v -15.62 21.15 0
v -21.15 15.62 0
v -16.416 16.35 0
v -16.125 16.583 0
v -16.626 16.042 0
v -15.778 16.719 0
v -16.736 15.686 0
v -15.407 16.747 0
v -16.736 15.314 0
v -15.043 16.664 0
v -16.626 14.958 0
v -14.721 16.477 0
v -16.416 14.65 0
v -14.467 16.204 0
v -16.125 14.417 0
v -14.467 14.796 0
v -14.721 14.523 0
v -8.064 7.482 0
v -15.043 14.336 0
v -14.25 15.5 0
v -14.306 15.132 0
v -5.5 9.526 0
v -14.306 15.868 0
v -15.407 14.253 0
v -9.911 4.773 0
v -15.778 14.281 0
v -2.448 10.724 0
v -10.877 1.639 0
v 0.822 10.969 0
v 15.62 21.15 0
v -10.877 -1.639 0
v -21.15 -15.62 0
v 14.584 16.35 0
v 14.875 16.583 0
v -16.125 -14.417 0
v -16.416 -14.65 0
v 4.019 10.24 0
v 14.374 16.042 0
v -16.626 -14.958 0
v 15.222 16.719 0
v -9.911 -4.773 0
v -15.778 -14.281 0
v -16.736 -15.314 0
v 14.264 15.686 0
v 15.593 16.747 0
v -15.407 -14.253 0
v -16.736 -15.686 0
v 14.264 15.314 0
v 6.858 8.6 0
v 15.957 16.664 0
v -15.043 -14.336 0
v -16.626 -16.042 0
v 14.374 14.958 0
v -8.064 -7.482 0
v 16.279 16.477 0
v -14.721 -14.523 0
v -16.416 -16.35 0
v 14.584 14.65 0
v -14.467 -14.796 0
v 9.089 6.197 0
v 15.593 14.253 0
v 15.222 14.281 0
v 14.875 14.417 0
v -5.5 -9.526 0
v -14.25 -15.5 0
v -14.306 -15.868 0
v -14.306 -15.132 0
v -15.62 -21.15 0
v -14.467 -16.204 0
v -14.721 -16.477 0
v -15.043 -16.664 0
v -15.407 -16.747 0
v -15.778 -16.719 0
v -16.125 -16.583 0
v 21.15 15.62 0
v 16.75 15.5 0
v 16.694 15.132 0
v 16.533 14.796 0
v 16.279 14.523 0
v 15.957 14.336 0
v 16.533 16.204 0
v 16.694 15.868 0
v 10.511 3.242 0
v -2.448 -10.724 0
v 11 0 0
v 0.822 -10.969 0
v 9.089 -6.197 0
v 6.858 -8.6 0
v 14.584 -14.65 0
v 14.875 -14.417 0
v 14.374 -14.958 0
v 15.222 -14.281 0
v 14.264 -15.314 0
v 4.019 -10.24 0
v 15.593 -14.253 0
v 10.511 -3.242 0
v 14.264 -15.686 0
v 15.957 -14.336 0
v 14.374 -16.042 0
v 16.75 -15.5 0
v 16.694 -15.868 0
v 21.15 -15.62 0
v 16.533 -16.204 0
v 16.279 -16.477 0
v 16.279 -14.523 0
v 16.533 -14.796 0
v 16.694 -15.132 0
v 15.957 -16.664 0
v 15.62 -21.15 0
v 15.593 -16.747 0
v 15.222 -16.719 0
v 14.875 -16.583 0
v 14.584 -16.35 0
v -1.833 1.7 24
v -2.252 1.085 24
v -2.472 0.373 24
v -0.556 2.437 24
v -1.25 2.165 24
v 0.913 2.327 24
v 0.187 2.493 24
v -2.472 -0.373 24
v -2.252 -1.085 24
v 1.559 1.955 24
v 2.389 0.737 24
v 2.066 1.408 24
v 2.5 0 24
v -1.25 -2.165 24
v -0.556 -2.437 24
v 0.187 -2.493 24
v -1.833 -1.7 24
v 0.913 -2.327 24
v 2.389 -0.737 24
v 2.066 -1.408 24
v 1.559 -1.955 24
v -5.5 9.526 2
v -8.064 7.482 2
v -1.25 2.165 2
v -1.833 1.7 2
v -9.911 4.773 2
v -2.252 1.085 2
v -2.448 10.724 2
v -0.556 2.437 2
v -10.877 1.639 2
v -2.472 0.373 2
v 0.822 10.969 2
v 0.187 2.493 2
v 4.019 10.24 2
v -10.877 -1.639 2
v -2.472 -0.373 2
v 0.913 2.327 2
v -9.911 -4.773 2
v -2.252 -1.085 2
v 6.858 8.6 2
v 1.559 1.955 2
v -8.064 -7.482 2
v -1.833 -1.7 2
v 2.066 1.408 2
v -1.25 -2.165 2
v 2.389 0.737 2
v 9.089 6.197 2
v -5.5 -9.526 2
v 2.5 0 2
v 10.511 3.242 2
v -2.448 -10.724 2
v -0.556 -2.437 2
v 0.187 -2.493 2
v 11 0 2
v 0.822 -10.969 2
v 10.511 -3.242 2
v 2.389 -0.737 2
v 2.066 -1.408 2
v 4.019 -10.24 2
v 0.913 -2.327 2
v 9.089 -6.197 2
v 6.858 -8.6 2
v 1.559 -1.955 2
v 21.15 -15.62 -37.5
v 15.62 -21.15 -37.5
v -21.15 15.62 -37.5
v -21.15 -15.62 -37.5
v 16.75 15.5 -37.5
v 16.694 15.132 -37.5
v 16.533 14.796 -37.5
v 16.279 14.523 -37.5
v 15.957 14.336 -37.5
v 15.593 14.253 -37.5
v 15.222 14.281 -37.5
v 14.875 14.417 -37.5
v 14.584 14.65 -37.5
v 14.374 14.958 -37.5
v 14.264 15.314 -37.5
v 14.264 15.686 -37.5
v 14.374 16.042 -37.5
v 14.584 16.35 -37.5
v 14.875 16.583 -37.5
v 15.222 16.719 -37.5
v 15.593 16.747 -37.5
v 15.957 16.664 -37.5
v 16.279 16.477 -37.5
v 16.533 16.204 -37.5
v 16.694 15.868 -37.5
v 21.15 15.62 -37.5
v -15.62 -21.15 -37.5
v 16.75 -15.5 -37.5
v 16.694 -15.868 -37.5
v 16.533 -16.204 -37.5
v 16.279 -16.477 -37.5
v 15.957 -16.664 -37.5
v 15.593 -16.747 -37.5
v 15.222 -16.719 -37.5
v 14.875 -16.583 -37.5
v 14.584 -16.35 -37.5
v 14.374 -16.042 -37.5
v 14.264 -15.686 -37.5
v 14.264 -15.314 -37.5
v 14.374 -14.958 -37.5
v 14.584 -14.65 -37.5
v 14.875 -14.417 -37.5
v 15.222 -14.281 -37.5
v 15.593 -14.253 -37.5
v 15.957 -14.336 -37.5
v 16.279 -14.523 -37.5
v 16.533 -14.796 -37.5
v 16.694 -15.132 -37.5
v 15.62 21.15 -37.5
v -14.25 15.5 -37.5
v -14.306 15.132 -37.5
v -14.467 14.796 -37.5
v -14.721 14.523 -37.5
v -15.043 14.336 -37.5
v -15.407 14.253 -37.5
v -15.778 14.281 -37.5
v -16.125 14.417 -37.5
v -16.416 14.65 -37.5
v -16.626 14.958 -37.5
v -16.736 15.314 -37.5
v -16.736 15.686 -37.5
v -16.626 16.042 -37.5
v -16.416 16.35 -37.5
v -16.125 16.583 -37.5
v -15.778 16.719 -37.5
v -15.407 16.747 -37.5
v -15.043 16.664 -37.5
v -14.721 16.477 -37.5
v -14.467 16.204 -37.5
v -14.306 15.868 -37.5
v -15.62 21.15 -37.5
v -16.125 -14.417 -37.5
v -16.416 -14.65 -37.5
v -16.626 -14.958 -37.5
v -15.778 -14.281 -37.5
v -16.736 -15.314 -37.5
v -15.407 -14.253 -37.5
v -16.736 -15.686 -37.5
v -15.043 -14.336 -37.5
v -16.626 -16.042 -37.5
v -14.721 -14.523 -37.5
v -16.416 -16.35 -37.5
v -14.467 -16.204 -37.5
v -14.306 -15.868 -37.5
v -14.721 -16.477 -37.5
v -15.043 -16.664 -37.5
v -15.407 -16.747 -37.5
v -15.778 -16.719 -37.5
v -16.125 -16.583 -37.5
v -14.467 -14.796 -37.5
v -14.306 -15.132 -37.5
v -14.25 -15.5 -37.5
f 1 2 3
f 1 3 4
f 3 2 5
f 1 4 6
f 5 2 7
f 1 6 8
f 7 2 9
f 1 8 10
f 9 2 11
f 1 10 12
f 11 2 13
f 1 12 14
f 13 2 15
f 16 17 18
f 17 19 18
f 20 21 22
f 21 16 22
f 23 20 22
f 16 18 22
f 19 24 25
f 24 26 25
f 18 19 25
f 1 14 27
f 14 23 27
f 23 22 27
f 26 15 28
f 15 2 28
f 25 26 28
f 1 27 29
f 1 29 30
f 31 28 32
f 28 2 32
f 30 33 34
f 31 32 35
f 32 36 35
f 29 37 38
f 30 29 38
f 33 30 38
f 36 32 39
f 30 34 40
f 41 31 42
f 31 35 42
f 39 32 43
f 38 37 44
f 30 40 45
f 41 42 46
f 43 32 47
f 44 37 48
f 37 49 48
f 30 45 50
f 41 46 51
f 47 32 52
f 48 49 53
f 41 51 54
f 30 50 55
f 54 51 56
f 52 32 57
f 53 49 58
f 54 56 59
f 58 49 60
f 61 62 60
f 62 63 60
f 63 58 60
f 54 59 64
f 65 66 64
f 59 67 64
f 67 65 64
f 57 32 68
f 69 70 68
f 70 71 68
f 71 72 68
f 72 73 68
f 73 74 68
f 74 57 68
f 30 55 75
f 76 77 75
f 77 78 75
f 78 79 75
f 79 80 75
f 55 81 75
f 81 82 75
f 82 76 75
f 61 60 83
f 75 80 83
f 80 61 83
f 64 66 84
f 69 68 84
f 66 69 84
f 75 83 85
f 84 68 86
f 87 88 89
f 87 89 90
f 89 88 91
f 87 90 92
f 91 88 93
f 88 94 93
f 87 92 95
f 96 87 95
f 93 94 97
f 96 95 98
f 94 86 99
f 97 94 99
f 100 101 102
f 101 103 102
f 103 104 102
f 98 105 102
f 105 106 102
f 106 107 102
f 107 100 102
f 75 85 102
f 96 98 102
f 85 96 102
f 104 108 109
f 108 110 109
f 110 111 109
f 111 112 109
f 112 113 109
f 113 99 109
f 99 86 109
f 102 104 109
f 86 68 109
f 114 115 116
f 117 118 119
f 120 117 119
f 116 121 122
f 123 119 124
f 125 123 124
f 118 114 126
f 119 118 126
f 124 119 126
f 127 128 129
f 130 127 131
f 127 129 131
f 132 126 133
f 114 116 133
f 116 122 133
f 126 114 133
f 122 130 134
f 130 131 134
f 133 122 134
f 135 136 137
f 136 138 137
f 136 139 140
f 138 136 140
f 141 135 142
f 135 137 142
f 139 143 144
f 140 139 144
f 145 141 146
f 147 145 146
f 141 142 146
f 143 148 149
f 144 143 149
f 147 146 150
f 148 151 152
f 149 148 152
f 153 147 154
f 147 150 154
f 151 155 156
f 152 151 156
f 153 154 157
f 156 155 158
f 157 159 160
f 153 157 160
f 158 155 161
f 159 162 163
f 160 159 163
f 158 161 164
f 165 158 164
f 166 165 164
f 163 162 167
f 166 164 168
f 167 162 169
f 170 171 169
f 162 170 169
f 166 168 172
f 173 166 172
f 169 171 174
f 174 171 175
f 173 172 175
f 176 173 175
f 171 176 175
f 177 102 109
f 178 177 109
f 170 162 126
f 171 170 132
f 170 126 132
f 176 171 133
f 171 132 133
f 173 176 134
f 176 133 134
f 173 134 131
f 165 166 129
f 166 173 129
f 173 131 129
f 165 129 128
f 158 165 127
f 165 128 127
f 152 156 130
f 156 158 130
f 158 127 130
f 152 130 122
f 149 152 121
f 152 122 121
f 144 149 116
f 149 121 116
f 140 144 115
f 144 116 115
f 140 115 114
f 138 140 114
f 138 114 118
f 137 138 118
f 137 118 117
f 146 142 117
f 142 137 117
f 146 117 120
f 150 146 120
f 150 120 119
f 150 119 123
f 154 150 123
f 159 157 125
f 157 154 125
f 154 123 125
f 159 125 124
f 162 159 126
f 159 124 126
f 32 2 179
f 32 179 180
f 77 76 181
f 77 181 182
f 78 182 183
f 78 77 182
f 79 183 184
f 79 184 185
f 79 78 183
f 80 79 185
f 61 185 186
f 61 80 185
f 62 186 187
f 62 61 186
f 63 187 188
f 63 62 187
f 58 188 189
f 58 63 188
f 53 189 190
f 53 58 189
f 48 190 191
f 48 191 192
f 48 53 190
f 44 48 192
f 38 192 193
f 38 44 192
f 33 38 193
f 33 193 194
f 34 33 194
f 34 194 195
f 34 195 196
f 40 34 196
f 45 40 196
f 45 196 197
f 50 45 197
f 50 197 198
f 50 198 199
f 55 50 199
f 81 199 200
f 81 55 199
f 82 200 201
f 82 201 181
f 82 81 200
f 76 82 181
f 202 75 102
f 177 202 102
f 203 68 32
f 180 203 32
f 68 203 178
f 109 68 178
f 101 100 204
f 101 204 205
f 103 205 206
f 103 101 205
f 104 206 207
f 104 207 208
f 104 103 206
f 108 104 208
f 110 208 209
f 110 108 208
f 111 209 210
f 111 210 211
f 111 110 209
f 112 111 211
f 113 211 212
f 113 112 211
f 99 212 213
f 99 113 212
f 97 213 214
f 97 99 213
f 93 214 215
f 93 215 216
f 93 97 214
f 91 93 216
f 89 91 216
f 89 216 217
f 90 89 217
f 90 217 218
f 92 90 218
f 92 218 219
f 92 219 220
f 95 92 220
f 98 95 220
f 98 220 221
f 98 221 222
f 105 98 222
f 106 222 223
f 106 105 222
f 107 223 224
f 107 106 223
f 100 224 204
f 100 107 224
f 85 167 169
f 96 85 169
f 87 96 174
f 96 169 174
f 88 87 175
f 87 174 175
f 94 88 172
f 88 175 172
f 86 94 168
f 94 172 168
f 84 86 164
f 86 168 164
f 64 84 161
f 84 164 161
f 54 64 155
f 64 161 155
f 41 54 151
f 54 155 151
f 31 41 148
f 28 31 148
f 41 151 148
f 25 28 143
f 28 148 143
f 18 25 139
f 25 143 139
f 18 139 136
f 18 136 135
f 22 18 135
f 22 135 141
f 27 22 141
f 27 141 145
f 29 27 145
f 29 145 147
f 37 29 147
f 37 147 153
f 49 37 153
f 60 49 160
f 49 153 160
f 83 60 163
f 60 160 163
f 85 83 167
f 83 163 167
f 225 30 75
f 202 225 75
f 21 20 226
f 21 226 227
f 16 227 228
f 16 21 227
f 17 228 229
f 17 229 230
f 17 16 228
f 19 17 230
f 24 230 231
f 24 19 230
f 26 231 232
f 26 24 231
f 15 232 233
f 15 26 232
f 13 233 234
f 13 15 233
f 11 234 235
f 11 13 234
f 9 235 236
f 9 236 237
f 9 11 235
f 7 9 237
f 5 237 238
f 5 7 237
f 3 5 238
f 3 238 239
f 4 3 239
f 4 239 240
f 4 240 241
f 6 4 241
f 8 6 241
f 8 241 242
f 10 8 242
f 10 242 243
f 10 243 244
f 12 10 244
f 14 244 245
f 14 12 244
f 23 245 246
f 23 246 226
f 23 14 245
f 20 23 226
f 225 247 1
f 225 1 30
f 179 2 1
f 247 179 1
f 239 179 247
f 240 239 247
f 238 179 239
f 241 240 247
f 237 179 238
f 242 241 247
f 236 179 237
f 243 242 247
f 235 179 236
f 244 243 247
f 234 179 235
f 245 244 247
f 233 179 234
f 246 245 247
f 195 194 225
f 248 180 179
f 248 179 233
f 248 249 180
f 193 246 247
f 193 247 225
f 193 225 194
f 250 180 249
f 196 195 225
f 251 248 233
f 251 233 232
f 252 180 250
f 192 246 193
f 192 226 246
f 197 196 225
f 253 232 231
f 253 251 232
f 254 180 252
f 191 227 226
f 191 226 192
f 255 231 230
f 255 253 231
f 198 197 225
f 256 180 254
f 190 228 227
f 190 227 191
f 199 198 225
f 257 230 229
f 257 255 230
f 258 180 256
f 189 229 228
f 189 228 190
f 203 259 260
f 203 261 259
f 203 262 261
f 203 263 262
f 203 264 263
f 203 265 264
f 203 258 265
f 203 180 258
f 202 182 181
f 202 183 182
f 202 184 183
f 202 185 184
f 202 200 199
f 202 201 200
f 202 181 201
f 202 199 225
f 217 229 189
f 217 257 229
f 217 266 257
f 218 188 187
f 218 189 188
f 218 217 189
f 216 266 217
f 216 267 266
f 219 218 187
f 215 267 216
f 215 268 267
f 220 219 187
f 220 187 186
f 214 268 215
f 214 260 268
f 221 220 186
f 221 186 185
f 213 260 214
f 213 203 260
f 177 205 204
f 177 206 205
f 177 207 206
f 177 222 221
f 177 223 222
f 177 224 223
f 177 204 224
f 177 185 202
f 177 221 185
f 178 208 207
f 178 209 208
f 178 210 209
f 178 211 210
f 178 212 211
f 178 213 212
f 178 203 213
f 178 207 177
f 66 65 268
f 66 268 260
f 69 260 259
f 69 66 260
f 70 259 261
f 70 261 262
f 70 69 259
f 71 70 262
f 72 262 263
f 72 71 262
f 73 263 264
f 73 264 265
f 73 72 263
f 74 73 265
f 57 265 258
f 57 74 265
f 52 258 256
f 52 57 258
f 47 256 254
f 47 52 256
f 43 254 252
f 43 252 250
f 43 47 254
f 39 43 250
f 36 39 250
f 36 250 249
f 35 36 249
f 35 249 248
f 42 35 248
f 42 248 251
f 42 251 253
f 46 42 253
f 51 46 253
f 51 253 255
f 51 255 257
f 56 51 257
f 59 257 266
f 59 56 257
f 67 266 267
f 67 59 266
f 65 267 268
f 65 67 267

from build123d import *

# Parameters (mm, degrees)
BOX002_W                    = 100
BOX002_H                    = 100
BOX002_DEPTH                = 37.5
COMPOUND002_PLACEMENT_ANGLE = 135
BOX003_W                    = 100
BOX003_H                    = 100
BOX003_DEPTH                = 37.5
COMPOUND003_PLACEMENT_ANGLE = 225
BOX004_W                    = 100
BOX004_H                    = 100
BOX004_DEPTH                = 37.5
COMPOUND004_PLACEMENT_ANGLE = 315
BOX001_W                    = 100
BOX001_H                    = 100
BOX001_DEPTH                = 37.5
COMPOUND001_PLACEMENT_ANGLE = 45
CYLINDER002_R               = 1.25
CYLINDER002_DEPTH           = 37.5
CYLINDER003_R               = 1.25
CYLINDER003_DEPTH           = 37.5
CYLINDER004_R               = 1.25
CYLINDER004_DEPTH           = 37.5
CYLINDER005_R               = 1.25
CYLINDER005_DEPTH           = 37.5
BOX_W                       = 42.3
BOX_H                       = 42.3
BOX_DEPTH                   = 37.5
CYLINDER_R                  = 11
CYLINDER_DEPTH              = 2
CYLINDER001_R               = 2.5
CYLINDER001_DEPTH           = 24
CUT001_PLACEMENT_ANGLE      = 180


with BuildPart() as compound002:
    # Box002 → Box002 (new body)
    with BuildSketch(Plane(origin=(26, -50, 0), x_dir=(1, 0, 0), z_dir=(0, 0, 1))):
        with Locations((50, 50)):
            Rectangle(BOX002_W, BOX002_H)
    extrude(amount=BOX002_DEPTH)


with BuildPart() as compound002_1:
    # Compound002 placement: moved
    add(compound002.part.rotate(Axis((0, 0, 0), (0, 0, 1)), COMPOUND002_PLACEMENT_ANGLE))


with BuildPart() as compound003:
    # Box003 → Box003 (new body)
    with BuildSketch(Plane(origin=(26, -50, 0), x_dir=(1, 0, 0), z_dir=(0, 0, 1))):
        with Locations((50, 50)):
            Rectangle(BOX003_W, BOX003_H)
    extrude(amount=BOX003_DEPTH)


with BuildPart() as compound003_1:
    # Compound003 placement: moved
    add(compound003.part.rotate(Axis((0, 0, 0), (0, 0, 1)), COMPOUND003_PLACEMENT_ANGLE))


with BuildPart() as compound004:
    # Box004 → Box004 (new body)
    with BuildSketch(Plane(origin=(26, -50, 0), x_dir=(1, 0, 0), z_dir=(0, 0, 1))):
        with Locations((50, 50)):
            Rectangle(BOX004_W, BOX004_H)
    extrude(amount=BOX004_DEPTH)


with BuildPart() as compound004_1:
    # Compound004 placement: moved
    add(compound004.part.rotate(Axis((0, 0, 0), (0, 0, 1)), COMPOUND004_PLACEMENT_ANGLE))


with BuildPart() as compound005:
    # Box001 → Box001 (new body)
    with BuildSketch(Plane(origin=(26, -50, 0), x_dir=(1, 0, 0), z_dir=(0, 0, 1))):
        with Locations((50, 50)):
            Rectangle(BOX001_W, BOX001_H)
    extrude(amount=BOX001_DEPTH)


with BuildPart() as compound005_1:
    # Compound001 placement: moved
    add(compound005.part.rotate(Axis((0, 0, 0), (0, 0, 1)), COMPOUND001_PLACEMENT_ANGLE))

    # Compound005: union Compound002, Compound003, Compound004
    add(compound002_1.part)
    add(compound003_1.part)
    add(compound004_1.part)


with BuildPart() as cylinder002:
    # Cylinder002 → Cylinder002 (new body)
    with BuildSketch(Plane(origin=(15.5, 15.5, 0), x_dir=(1, 0, 0), z_dir=(0, 0, 1))):
        Circle(CYLINDER002_R)
    extrude(amount=CYLINDER002_DEPTH)


with BuildPart() as cylinder003:
    # Cylinder003 → Cylinder003 (new body)
    with BuildSketch(Plane(origin=(-15.5, 15.5, 0), x_dir=(1, 0, 0), z_dir=(0, 0, 1))):
        Circle(CYLINDER003_R)
    extrude(amount=CYLINDER003_DEPTH)


with BuildPart() as cylinder004:
    # Cylinder004 → Cylinder004 (new body)
    with BuildSketch(Plane(origin=(15.5, -15.5, 0), x_dir=(1, 0, 0), z_dir=(0, 0, 1))):
        Circle(CYLINDER004_R)
    extrude(amount=CYLINDER004_DEPTH)


with BuildPart() as compound:
    # Cylinder005 → Cylinder005 (new body)
    with BuildSketch(Plane(origin=(-15.5, -15.5, 0), x_dir=(1, 0, 0), z_dir=(0, 0, 1))):
        Circle(CYLINDER005_R)
    extrude(amount=CYLINDER005_DEPTH)

    # Compound: union Cylinder002, Cylinder003, Cylinder004
    add(cylinder002.part)
    add(cylinder003.part)
    add(cylinder004.part)


with BuildPart() as cube:
    # Box → Box (new body)
    with BuildSketch(Plane(origin=(-21.15, -21.15, 0), x_dir=(1, 0, 0), z_dir=(0, 0, 1))):
        with Locations((21.15, 21.15)):
            Rectangle(BOX_W, BOX_H)
    extrude(amount=BOX_DEPTH)


with BuildPart() as fusion:
    # Cylinder → Cylinder (new body)
    with BuildSketch(Plane.XY.offset(-2)):
        Circle(CYLINDER_R)
    extrude(amount=CYLINDER_DEPTH)

    # Fusion: union Cube
    add(cube.part)


with BuildPart() as nema17stepper:
    # Cylinder001 → Cylinder001 (new body)
    with BuildSketch(Plane.XY.offset(-24)):
        Circle(CYLINDER001_R)
    extrude(amount=CYLINDER001_DEPTH)

    # Fusion001: union Fusion
    add(fusion.part)

    # Cut: cut Compound
    add(compound.part, mode=Mode.SUBTRACT)

    # Cut001: cut Compound005
    add(compound005_1.part, mode=Mode.SUBTRACT)


with BuildPart() as nema17stepper_1:
    # Cut001 placement: moved
    add(nema17stepper.part.rotate(Axis((0, 0, 0), (1, 0, 0)), CUT001_PLACEMENT_ANGLE))


solid = nema17stepper_1.part
